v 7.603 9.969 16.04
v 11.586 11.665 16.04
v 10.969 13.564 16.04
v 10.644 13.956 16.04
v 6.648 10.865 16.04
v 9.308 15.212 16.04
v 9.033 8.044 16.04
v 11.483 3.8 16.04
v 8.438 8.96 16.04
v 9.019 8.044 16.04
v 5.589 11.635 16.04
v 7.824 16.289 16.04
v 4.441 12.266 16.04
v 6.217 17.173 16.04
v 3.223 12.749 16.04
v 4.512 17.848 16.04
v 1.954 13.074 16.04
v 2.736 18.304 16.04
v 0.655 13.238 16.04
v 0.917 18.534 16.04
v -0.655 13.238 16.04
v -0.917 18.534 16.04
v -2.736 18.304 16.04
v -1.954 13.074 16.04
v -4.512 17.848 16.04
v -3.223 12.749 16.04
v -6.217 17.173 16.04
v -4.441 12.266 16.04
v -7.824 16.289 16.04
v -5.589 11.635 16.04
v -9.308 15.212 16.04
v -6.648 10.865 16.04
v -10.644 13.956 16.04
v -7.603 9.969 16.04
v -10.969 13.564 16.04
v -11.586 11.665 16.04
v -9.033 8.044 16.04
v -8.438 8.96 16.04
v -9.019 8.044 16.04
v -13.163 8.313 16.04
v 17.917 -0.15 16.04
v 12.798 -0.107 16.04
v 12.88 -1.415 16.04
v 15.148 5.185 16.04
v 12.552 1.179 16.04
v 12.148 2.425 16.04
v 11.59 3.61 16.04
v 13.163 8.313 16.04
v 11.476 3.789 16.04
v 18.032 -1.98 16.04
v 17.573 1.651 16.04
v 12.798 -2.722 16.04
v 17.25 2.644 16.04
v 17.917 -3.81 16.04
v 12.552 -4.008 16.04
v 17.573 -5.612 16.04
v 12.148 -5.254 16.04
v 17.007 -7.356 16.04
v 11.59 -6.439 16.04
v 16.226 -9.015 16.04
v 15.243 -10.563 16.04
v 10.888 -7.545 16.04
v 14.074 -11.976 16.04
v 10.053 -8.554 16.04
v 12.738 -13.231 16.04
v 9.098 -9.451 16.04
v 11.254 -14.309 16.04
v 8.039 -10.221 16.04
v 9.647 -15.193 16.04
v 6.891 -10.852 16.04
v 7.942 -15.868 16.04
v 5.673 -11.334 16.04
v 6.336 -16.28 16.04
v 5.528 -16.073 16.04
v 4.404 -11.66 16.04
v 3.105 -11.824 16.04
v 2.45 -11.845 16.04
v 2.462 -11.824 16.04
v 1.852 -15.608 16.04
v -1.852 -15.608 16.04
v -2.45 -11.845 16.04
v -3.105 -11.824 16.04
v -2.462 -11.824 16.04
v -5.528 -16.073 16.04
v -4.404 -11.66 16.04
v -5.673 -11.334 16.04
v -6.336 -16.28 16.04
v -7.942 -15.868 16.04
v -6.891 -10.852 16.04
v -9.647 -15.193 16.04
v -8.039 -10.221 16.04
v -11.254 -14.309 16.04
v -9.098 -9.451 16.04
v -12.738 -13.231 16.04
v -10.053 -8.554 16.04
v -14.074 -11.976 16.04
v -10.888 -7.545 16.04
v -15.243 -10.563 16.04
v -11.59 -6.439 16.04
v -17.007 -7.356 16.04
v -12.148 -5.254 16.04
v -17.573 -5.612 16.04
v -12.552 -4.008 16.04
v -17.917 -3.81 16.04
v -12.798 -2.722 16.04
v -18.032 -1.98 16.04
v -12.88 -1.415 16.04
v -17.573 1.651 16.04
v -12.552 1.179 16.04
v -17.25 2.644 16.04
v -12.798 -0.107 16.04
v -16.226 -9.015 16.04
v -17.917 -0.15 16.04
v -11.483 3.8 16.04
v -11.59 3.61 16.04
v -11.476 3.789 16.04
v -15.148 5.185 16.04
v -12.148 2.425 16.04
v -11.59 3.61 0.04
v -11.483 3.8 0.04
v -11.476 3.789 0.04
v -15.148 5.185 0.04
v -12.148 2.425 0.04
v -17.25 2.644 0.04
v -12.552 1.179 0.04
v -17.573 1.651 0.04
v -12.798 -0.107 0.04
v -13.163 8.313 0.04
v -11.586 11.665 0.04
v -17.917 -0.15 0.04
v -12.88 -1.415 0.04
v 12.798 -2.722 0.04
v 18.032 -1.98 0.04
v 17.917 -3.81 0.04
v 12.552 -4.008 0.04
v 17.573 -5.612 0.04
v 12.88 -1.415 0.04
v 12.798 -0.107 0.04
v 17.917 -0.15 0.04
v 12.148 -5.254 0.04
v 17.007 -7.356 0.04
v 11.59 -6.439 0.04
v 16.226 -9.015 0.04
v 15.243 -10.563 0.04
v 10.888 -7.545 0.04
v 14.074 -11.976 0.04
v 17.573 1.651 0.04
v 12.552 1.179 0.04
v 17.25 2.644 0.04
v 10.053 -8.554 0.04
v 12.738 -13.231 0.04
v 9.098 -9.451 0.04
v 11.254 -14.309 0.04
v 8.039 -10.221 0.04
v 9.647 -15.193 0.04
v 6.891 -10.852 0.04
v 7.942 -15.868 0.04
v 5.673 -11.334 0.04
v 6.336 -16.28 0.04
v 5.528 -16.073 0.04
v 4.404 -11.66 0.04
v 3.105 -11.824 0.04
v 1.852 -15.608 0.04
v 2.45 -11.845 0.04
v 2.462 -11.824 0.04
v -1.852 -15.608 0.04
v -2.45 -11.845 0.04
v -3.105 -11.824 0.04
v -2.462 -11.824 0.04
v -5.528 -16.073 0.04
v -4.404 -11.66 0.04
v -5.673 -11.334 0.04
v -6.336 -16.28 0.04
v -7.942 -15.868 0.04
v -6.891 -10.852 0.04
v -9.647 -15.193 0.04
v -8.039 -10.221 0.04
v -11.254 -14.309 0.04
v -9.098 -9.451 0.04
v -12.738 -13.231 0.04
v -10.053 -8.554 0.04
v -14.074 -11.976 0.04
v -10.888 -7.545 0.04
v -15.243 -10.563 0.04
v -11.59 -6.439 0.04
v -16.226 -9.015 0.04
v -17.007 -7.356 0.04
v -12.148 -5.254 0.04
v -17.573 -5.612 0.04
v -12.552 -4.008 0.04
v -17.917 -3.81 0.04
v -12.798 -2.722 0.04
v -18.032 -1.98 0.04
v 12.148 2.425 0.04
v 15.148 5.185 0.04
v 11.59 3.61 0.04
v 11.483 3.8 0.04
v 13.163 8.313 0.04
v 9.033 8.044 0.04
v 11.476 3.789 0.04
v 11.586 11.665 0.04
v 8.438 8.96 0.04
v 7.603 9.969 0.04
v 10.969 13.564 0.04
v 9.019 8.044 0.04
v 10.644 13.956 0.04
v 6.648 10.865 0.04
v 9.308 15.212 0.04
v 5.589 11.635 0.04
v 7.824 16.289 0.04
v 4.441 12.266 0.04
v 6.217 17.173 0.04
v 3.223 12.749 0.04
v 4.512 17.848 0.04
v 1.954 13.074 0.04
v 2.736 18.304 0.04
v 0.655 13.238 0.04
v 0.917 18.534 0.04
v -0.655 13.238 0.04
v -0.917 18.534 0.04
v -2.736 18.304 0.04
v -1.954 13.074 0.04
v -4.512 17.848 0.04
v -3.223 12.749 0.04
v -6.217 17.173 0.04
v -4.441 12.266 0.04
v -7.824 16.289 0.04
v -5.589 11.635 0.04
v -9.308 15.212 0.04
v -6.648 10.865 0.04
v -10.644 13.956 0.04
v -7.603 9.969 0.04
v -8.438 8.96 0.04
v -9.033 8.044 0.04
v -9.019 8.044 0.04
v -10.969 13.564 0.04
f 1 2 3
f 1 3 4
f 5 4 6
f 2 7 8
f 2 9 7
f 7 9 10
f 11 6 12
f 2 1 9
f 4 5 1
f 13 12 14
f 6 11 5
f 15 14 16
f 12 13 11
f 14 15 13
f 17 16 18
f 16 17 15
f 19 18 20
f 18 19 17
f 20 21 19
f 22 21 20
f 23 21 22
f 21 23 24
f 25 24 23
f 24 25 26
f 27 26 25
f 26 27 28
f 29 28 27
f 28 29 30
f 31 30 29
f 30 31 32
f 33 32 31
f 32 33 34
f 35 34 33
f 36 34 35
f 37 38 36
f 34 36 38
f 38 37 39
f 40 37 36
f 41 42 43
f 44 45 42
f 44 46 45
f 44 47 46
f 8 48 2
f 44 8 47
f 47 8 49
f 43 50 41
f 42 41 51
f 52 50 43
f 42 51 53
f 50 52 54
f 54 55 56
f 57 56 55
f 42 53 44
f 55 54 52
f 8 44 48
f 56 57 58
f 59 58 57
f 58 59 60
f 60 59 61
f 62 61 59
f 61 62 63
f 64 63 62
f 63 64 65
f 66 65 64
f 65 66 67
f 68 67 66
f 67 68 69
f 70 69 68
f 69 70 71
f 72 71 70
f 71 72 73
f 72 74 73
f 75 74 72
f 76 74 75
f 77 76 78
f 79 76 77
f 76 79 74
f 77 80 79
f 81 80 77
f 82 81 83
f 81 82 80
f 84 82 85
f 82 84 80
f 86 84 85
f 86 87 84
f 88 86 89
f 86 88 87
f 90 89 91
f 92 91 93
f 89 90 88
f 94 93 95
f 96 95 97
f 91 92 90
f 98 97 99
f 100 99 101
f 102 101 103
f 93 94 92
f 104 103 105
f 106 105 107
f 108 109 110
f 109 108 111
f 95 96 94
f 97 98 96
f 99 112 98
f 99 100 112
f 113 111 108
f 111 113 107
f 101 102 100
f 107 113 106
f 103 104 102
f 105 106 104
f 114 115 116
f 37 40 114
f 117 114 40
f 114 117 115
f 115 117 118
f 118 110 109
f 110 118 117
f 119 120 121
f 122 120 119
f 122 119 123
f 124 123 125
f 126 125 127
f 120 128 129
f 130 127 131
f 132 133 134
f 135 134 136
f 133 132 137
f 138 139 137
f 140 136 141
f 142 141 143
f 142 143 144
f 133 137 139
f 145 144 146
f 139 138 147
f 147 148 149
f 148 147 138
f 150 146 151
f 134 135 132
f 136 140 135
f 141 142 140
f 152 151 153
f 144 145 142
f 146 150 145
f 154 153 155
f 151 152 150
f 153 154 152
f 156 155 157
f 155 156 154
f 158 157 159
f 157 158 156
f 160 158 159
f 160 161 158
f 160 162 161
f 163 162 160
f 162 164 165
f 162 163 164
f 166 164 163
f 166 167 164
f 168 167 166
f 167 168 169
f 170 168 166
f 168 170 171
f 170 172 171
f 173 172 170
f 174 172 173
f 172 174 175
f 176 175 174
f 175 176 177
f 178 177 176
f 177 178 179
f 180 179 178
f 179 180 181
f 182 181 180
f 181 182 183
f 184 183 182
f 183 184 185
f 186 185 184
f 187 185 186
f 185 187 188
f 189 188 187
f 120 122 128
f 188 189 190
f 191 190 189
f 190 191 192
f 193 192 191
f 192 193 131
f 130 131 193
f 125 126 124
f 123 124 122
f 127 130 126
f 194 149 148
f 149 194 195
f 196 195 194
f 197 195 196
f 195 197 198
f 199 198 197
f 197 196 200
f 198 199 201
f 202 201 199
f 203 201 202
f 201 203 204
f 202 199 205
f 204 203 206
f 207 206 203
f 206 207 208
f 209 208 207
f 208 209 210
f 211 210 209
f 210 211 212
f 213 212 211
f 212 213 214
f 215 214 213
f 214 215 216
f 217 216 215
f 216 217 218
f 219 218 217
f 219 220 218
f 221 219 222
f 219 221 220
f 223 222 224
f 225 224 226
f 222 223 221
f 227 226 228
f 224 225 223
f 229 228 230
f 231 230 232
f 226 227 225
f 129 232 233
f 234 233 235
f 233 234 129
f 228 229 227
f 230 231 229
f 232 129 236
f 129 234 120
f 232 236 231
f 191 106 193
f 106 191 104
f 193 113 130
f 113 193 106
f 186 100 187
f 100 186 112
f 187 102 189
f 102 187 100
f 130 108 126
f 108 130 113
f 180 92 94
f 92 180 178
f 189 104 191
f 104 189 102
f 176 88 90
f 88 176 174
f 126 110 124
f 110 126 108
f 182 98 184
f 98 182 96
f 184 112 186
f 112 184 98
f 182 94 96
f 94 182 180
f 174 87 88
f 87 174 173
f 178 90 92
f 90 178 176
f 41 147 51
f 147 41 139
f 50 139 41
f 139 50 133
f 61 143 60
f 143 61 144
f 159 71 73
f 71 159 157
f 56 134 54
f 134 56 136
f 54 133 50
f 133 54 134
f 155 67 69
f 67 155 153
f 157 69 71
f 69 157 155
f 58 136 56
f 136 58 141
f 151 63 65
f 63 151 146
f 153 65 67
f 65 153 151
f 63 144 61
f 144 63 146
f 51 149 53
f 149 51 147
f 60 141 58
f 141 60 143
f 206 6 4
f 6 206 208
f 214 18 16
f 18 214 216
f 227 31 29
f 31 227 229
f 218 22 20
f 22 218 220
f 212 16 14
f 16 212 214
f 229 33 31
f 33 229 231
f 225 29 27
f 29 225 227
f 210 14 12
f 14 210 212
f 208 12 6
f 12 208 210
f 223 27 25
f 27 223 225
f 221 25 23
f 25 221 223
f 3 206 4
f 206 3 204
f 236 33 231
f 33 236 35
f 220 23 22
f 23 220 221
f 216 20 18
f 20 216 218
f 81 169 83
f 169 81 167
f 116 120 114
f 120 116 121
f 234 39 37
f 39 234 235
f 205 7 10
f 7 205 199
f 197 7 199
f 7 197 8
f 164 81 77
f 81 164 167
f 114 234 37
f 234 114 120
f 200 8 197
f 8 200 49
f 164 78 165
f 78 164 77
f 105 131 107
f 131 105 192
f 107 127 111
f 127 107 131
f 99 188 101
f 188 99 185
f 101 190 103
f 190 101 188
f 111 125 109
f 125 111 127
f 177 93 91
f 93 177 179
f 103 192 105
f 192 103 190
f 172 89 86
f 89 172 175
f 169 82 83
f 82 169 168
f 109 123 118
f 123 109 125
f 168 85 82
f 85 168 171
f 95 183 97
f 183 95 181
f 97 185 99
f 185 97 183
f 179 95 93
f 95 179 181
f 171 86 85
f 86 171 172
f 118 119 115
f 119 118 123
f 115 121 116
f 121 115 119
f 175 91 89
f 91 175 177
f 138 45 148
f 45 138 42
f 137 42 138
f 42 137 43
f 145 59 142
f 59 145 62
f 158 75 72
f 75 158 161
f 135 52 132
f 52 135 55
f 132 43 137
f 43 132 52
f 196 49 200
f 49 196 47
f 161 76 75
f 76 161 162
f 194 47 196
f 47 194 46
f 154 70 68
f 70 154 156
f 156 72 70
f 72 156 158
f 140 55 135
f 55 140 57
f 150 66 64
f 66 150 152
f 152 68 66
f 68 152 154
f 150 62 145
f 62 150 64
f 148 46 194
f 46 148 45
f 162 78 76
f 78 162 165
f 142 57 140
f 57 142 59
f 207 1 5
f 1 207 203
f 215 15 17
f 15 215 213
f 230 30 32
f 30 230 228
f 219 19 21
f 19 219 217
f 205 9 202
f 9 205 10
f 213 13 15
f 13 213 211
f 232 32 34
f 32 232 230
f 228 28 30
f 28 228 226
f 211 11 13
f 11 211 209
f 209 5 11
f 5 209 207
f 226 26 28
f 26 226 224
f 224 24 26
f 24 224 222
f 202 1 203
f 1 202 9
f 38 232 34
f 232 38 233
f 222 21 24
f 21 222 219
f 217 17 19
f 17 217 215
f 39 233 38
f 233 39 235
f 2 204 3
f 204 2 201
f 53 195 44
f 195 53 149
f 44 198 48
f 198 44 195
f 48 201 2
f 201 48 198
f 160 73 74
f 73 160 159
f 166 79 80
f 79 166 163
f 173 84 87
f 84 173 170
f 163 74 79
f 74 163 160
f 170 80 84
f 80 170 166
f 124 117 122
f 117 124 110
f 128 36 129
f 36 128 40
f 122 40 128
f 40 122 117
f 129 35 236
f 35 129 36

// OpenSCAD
//cylinder(d=29.5, h=2, center=true);
//polygon(points=[[27 * cos(0),0],[100,0],[130,50],[30,50]]);
use <MCAD/3d_triangle.scad>;


$fn=50;

//--- Stopper size
h =40;
r=29.8;
flat = 14;
//--- podRadius = 29.5;
podRadius = 29.5;

//--- Radius of in-circle
vertices  =  3dtri_sides2coord(flat, flat, flat);
ir = 3dtri_radiusOfIn_circle (vertices[0],vertices[1],vertices[2]);
//--- Center of in-circle
ic = 3dtri_centerOfIn_circle (vertices[0],vertices[1],vertices[2],ir);


difference () {
  //--- 
  scale([.35, .35, .5]) // .38
  difference () {
    //--- Main pod outer shape
    scale([1.4, 1.4, .8])
        translate ([0,0,.1]-ic) 
        3dtri_rnd_draw (vertices[0], vertices[1], vertices[2], h, r);
    //--- Main pod inner shape
    translate (-ic)
        3dtri_rnd_draw (vertices[0], vertices[1], vertices[2], h, r);
  }
  
  //--- Extract 3 pods shape
  for (n = [ 0 : 2 ])
    translate([
        (r + podRadius/2 + .5) * sin(360 * n / 3 + 360/6),
        (r + podRadius/2 + .5) * cos(360 * n / 3 + 360/6),
        1
    ])
    cylinder(h=h+2, r=podRadius, center=true);
};
